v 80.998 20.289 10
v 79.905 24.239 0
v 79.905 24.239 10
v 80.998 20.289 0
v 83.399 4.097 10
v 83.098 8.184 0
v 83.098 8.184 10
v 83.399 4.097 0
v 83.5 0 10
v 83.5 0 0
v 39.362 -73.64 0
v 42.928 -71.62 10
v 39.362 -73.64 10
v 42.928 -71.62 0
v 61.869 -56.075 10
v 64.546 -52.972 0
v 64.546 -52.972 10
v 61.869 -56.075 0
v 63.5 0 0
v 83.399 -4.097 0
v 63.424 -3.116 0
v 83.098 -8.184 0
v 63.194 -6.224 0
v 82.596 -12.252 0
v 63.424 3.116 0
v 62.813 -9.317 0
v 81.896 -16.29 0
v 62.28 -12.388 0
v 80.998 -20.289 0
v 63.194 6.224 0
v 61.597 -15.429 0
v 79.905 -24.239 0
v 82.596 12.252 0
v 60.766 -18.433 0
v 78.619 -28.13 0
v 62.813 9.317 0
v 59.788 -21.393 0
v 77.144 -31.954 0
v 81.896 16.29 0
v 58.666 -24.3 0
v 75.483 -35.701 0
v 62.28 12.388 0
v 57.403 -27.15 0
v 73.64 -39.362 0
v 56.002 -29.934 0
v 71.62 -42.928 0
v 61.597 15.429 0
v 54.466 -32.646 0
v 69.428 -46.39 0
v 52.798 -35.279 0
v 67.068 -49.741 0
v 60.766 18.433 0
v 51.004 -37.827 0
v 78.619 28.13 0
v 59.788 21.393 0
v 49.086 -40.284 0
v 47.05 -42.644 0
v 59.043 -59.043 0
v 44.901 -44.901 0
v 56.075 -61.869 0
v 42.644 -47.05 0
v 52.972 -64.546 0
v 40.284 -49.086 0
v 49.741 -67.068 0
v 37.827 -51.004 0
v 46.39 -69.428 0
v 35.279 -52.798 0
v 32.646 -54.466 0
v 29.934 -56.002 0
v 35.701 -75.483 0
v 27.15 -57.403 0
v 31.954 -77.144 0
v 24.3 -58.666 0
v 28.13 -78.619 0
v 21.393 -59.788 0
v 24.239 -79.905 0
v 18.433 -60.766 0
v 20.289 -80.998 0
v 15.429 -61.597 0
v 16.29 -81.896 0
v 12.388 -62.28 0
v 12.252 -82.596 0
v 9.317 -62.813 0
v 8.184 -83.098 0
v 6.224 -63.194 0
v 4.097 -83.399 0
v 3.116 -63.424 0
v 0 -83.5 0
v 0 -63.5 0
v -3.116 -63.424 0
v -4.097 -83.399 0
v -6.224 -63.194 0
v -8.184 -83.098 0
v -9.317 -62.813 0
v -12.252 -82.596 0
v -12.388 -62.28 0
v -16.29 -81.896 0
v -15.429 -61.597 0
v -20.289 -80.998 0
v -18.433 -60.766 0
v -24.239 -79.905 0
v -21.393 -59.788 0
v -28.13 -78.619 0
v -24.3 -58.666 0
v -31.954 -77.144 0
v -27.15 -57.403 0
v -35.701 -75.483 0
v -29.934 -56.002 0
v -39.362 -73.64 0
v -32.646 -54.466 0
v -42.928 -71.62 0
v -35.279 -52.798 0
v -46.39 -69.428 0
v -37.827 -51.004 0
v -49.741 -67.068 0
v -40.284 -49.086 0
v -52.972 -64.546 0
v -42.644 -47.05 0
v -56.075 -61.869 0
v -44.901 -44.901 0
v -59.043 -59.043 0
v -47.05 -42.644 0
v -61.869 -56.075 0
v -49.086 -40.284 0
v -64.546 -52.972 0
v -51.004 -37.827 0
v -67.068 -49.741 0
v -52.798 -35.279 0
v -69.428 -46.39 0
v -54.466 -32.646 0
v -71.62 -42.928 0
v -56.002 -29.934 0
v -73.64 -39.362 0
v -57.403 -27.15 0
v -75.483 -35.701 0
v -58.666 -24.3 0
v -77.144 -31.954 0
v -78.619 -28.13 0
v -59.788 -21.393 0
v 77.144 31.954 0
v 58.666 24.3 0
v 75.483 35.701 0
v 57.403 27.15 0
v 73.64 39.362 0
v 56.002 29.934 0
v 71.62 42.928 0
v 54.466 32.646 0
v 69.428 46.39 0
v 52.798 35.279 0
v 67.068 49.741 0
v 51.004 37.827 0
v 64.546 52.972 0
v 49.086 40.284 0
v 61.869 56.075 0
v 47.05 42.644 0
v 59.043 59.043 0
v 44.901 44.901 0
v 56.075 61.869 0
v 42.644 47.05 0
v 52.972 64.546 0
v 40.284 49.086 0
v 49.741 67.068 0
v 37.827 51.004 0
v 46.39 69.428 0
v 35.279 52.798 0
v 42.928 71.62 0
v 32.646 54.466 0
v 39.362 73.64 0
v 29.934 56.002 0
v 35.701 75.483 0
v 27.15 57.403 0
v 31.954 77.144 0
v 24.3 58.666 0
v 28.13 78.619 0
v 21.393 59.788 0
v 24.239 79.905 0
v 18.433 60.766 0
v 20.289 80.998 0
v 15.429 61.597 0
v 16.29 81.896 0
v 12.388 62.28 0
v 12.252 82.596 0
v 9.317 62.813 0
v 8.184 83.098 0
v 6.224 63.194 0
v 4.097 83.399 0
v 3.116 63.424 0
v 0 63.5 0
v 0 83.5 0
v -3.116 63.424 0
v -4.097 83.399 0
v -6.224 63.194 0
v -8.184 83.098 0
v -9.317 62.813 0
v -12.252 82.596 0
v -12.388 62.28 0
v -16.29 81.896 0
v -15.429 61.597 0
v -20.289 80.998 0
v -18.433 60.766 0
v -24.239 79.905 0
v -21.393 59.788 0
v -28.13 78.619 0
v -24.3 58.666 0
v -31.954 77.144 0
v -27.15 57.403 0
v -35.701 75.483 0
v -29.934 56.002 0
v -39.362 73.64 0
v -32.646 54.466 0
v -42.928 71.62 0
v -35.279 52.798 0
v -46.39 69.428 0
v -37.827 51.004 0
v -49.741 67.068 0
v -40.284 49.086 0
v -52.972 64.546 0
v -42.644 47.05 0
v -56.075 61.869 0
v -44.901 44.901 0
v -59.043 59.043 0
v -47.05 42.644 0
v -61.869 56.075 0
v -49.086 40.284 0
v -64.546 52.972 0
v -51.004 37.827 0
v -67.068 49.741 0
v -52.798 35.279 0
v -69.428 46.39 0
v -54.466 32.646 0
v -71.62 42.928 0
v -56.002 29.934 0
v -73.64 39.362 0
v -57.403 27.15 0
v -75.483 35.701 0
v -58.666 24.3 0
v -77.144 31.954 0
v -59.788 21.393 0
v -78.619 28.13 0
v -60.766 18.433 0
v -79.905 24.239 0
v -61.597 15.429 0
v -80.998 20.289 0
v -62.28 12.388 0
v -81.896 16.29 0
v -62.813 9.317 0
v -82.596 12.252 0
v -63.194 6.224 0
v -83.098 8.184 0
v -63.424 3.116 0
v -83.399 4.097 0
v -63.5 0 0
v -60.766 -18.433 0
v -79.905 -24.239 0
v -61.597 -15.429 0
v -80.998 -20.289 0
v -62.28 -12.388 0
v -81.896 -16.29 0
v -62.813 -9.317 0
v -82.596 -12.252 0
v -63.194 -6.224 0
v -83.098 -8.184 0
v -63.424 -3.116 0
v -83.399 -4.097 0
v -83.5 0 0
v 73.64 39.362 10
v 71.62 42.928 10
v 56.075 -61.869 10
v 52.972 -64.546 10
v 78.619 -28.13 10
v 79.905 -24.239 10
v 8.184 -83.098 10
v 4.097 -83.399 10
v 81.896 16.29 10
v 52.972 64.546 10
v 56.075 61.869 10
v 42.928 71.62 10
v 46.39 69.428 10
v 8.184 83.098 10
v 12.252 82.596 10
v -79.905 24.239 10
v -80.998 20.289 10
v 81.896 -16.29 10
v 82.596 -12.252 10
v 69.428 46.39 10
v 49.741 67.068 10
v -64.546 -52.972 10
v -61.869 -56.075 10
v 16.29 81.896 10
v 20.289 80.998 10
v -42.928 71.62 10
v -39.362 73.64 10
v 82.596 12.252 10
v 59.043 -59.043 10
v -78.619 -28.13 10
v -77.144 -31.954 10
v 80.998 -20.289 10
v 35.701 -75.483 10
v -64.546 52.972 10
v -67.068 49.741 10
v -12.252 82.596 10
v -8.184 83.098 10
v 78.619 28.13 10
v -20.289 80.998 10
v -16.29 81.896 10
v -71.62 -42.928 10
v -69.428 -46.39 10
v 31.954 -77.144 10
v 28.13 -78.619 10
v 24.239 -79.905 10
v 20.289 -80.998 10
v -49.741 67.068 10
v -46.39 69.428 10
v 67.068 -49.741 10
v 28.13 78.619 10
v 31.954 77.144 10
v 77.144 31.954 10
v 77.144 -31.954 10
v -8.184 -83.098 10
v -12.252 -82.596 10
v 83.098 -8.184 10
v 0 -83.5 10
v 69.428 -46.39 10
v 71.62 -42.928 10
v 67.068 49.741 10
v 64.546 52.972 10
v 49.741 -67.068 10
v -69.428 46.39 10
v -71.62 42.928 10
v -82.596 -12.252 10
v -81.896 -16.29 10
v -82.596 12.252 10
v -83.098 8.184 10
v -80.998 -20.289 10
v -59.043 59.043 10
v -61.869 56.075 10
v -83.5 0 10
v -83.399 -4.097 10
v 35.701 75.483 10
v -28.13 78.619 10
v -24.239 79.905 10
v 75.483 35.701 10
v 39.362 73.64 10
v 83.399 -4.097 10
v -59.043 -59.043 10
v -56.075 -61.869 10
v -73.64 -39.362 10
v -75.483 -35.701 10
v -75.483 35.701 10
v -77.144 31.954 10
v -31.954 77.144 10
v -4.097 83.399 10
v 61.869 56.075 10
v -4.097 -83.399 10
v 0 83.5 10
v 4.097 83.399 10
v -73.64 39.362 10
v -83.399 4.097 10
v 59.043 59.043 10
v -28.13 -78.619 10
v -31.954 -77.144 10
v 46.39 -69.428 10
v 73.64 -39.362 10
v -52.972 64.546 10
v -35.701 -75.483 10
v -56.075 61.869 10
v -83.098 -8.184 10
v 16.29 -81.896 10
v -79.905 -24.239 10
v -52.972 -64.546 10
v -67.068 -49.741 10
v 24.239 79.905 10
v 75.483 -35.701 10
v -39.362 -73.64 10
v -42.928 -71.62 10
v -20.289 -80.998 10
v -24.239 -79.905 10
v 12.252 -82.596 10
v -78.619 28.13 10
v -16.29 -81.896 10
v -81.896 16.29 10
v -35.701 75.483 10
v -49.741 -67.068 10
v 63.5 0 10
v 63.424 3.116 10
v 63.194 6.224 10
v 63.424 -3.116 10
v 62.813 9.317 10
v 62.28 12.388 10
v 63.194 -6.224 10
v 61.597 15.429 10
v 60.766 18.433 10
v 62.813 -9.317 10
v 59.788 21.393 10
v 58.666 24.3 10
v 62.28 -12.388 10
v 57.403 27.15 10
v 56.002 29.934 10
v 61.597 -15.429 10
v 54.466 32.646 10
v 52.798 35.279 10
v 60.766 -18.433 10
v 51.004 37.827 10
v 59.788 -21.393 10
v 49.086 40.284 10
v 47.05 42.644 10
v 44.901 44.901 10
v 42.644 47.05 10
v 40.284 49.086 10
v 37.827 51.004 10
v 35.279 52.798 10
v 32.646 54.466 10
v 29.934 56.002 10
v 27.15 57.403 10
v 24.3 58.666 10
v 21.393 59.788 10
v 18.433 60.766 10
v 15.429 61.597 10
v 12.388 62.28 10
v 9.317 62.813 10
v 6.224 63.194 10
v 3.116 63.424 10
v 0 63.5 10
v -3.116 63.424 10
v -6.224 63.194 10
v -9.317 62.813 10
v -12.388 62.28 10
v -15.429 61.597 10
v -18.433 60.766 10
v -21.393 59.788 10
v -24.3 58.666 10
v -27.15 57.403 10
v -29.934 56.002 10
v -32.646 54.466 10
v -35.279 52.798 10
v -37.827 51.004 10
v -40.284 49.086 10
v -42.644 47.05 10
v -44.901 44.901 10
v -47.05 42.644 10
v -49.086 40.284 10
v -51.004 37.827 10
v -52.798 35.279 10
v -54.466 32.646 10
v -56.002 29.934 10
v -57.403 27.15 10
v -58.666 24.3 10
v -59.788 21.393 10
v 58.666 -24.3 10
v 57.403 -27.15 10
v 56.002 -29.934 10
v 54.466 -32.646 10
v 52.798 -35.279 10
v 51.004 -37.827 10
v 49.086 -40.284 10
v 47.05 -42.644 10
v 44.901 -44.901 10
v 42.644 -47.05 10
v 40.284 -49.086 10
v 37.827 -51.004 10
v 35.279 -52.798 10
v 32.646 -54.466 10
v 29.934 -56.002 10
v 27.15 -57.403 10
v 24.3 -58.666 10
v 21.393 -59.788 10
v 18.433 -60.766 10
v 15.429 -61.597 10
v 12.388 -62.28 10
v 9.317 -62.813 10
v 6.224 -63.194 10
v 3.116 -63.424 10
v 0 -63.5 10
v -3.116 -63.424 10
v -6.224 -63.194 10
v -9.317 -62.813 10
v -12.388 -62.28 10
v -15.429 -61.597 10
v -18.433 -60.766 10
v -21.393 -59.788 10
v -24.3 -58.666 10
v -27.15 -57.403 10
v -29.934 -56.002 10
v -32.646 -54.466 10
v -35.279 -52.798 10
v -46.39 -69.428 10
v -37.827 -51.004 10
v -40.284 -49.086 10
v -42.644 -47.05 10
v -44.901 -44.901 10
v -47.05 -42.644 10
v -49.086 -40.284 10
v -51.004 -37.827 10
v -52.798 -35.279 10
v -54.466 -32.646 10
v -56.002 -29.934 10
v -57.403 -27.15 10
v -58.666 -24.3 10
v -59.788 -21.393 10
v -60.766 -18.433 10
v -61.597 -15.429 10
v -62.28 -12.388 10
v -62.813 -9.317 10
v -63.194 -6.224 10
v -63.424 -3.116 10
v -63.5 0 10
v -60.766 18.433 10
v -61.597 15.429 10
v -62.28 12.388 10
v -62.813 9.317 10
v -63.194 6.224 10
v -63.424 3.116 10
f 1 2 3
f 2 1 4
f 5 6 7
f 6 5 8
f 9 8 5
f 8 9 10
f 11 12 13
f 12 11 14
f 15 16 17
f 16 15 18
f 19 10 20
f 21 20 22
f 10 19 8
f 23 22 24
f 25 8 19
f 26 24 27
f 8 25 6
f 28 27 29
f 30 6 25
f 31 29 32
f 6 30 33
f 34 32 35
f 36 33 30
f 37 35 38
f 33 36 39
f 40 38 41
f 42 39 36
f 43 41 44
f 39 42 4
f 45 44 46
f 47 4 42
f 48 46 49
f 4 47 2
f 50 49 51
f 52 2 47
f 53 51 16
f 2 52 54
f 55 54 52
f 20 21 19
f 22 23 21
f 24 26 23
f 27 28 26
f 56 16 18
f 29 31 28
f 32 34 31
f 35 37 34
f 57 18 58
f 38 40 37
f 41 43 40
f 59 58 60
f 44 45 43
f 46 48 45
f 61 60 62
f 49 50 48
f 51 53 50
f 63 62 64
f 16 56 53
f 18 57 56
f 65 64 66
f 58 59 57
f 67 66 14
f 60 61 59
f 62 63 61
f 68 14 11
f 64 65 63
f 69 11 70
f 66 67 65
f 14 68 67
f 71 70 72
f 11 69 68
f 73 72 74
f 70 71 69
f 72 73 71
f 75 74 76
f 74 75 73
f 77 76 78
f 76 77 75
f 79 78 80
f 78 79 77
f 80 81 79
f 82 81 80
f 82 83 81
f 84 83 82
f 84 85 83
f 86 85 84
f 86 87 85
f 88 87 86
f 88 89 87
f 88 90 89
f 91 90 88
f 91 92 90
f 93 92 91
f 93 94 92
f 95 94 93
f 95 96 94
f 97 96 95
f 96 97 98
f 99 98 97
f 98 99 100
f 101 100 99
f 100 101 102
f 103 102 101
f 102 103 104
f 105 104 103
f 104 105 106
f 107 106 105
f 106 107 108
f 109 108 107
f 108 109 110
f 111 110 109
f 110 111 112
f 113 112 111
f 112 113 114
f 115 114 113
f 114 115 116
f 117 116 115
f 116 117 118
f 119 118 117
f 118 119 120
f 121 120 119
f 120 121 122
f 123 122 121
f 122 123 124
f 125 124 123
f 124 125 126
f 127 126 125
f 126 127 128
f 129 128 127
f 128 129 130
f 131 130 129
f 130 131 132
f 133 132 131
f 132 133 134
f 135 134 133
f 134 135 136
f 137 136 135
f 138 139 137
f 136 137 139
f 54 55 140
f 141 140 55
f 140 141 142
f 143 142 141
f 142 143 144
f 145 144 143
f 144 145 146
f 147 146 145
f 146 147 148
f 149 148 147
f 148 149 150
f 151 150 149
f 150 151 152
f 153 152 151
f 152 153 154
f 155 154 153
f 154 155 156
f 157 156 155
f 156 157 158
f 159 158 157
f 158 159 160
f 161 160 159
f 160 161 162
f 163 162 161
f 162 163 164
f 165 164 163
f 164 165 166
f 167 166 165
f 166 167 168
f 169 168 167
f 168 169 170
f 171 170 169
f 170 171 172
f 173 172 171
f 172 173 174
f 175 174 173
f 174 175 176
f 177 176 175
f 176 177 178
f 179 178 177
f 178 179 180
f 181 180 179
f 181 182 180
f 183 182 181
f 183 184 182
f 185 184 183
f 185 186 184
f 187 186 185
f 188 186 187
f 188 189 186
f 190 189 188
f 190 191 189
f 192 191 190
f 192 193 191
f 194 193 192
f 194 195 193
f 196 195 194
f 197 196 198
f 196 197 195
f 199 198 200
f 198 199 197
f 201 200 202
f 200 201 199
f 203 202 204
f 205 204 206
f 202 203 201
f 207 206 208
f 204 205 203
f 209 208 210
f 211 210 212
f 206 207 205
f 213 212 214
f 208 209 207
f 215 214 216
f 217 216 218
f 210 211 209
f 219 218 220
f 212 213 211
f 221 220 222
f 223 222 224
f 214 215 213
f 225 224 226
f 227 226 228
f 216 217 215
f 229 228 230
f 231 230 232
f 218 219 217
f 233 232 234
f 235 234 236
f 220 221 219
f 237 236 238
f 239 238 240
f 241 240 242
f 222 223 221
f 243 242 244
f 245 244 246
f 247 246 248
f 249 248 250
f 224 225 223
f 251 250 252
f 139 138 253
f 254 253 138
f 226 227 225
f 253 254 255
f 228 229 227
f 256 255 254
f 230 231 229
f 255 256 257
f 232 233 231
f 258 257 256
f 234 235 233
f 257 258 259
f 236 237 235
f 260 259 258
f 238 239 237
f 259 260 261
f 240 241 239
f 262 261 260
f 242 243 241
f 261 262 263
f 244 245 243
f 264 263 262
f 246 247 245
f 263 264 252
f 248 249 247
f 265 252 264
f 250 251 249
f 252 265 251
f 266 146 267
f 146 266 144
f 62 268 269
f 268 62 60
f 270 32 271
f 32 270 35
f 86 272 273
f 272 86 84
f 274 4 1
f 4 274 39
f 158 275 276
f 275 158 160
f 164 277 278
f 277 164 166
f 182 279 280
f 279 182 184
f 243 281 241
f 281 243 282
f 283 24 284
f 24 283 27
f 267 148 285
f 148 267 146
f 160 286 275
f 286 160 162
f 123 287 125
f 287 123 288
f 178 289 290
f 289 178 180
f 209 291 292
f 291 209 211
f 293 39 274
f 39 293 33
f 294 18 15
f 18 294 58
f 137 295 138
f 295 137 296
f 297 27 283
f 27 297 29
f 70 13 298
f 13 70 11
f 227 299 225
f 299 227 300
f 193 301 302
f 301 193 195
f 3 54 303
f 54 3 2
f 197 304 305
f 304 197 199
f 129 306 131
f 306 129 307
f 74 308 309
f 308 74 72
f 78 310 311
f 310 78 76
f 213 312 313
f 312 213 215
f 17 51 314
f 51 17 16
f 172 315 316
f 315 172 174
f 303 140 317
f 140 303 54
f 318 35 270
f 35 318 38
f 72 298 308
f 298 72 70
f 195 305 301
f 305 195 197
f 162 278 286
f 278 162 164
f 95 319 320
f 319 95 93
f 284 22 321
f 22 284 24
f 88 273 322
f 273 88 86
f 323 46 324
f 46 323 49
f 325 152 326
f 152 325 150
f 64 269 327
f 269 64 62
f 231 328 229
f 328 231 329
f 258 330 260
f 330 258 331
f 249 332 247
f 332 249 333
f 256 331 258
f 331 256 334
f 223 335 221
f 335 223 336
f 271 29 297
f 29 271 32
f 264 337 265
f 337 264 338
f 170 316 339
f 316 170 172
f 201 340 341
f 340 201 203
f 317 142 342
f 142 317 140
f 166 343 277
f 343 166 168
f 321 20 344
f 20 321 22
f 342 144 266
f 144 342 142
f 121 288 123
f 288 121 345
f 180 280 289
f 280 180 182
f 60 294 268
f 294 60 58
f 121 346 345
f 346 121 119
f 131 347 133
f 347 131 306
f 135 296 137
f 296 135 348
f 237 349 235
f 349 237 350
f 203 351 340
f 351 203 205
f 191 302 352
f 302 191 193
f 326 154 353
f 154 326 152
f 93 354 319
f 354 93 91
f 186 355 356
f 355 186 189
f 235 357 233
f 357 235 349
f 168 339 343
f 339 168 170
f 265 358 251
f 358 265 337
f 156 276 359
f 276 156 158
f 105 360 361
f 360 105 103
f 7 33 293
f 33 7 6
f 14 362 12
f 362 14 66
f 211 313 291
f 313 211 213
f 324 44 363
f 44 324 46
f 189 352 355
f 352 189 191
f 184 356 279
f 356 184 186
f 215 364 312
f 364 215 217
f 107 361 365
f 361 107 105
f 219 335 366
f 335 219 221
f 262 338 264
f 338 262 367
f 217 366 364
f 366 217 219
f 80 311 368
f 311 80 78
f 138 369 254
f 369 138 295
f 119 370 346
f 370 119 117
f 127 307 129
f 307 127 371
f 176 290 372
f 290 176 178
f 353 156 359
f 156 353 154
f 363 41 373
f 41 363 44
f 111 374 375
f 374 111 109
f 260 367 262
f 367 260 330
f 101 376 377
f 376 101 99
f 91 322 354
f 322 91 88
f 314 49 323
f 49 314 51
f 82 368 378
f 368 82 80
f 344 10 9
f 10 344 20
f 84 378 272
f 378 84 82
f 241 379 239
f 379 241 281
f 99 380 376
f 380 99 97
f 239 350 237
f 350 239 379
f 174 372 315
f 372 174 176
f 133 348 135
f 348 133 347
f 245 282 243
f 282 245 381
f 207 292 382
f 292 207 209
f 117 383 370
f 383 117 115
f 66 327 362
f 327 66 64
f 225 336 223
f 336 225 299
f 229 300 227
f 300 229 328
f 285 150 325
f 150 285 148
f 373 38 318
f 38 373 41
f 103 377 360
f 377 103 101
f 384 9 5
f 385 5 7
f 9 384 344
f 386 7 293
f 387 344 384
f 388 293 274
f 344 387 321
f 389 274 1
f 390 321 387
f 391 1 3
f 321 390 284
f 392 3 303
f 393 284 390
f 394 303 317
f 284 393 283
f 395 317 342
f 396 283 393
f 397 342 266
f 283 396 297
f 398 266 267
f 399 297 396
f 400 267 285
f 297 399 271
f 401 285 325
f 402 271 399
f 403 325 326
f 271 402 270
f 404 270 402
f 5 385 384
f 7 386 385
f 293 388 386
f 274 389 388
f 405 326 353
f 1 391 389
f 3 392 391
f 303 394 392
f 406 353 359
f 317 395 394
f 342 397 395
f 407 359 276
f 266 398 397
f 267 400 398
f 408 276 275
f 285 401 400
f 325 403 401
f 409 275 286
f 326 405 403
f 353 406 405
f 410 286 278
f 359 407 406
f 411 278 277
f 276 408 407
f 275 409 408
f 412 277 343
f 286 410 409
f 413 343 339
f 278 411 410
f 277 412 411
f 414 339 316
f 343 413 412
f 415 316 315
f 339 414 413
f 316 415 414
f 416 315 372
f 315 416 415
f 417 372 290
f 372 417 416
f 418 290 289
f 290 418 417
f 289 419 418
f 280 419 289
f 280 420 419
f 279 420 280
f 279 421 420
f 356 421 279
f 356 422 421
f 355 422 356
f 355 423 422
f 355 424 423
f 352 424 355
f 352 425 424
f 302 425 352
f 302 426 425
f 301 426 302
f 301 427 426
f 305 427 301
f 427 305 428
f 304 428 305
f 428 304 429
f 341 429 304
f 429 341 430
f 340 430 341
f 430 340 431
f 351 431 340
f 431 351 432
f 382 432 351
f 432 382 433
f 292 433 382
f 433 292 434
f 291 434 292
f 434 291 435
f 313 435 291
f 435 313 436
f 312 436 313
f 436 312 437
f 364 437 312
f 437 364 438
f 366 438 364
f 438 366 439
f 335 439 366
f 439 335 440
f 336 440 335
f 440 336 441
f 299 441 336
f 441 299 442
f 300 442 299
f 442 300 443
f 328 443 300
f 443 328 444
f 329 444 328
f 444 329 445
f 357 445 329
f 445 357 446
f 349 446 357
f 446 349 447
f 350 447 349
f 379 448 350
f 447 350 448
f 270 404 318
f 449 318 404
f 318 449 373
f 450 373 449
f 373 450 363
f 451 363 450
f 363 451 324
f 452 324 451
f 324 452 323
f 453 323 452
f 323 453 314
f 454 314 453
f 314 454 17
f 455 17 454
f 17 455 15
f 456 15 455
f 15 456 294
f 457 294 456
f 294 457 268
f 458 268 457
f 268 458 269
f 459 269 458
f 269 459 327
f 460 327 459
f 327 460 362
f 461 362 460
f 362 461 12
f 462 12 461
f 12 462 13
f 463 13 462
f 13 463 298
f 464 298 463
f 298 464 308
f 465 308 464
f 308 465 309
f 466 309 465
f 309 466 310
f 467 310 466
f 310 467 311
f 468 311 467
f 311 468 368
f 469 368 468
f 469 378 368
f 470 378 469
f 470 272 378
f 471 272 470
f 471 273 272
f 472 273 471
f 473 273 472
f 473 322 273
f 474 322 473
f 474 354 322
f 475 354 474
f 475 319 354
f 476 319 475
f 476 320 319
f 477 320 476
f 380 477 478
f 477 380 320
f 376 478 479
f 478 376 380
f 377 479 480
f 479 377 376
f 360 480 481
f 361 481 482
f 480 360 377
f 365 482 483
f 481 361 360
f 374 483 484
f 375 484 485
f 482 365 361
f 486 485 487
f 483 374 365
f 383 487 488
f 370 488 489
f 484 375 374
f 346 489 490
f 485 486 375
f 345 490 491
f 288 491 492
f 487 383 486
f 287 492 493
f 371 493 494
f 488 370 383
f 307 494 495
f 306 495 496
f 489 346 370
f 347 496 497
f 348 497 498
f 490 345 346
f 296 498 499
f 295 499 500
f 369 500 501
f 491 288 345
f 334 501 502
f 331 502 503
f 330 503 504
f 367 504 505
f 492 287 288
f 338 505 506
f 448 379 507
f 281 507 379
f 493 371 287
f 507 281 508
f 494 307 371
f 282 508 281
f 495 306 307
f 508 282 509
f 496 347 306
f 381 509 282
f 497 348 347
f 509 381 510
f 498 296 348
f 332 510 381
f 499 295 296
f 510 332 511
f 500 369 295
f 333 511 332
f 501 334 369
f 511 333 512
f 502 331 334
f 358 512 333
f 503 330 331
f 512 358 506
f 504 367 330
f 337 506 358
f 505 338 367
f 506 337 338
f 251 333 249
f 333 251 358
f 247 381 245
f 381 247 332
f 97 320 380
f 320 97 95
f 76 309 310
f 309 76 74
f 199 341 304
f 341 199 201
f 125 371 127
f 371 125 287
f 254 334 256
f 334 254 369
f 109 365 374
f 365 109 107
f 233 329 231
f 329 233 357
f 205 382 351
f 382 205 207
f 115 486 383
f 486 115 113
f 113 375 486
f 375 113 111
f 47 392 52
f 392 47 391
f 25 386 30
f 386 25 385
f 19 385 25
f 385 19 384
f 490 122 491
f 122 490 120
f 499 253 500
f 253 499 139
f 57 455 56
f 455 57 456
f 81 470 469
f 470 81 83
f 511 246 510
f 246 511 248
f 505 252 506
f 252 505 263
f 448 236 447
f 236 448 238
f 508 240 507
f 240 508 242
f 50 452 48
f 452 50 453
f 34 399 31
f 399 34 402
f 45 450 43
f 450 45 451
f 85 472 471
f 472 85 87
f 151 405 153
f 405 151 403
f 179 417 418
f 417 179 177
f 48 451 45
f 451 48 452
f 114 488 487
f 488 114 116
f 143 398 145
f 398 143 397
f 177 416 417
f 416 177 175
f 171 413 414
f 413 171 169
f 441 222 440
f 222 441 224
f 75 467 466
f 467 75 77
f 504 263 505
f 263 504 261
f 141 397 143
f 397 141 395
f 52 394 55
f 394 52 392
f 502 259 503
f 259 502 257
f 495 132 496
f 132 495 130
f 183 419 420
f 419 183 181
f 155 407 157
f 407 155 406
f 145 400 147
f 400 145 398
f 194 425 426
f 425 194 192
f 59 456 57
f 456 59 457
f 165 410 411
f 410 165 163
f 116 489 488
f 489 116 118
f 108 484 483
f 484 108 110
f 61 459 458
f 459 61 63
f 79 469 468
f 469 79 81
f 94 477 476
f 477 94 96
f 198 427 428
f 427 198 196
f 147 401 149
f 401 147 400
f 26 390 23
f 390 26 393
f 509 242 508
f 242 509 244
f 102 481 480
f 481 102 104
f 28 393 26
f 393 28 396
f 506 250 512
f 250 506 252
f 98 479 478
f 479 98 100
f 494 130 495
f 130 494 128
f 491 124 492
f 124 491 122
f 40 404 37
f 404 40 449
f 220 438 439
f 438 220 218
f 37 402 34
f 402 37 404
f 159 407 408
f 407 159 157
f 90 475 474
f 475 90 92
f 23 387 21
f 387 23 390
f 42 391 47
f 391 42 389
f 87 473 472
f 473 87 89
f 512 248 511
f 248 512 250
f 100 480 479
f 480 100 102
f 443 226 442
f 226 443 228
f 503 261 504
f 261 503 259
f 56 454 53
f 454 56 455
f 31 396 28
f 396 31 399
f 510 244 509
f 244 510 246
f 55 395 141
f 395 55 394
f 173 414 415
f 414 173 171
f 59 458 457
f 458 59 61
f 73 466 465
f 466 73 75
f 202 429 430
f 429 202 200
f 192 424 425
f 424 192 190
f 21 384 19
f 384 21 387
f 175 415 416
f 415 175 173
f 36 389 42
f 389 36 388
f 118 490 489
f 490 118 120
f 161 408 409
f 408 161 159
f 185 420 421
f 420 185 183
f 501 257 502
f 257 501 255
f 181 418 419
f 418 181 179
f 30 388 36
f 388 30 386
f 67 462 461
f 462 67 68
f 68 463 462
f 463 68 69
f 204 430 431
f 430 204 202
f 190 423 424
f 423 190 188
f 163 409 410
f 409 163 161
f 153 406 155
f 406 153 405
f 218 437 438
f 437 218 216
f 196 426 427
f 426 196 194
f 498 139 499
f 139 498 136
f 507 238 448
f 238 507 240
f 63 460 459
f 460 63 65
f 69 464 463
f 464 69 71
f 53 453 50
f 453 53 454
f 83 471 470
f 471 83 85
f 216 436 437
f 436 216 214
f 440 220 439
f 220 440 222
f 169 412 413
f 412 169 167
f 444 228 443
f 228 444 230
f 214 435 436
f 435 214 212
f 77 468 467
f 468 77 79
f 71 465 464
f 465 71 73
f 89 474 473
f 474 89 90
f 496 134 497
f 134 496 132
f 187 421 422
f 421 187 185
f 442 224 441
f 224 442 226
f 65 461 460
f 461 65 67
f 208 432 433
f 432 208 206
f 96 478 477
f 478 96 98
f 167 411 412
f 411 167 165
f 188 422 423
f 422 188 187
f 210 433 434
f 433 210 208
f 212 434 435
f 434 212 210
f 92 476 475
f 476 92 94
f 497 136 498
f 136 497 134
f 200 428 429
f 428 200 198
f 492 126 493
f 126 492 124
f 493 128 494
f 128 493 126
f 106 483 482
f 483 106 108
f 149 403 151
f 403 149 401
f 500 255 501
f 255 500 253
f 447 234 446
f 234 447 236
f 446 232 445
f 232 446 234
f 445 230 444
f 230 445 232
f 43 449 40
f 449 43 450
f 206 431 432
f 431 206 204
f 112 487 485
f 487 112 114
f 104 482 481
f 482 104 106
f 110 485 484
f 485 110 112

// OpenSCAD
dia = 127;
offset = 20;
height = 10;

$fn = 128;

difference() {
    cylinder(d = 2 * offset + dia, h = height);
    cylinder(d = dia, h = height);
}
